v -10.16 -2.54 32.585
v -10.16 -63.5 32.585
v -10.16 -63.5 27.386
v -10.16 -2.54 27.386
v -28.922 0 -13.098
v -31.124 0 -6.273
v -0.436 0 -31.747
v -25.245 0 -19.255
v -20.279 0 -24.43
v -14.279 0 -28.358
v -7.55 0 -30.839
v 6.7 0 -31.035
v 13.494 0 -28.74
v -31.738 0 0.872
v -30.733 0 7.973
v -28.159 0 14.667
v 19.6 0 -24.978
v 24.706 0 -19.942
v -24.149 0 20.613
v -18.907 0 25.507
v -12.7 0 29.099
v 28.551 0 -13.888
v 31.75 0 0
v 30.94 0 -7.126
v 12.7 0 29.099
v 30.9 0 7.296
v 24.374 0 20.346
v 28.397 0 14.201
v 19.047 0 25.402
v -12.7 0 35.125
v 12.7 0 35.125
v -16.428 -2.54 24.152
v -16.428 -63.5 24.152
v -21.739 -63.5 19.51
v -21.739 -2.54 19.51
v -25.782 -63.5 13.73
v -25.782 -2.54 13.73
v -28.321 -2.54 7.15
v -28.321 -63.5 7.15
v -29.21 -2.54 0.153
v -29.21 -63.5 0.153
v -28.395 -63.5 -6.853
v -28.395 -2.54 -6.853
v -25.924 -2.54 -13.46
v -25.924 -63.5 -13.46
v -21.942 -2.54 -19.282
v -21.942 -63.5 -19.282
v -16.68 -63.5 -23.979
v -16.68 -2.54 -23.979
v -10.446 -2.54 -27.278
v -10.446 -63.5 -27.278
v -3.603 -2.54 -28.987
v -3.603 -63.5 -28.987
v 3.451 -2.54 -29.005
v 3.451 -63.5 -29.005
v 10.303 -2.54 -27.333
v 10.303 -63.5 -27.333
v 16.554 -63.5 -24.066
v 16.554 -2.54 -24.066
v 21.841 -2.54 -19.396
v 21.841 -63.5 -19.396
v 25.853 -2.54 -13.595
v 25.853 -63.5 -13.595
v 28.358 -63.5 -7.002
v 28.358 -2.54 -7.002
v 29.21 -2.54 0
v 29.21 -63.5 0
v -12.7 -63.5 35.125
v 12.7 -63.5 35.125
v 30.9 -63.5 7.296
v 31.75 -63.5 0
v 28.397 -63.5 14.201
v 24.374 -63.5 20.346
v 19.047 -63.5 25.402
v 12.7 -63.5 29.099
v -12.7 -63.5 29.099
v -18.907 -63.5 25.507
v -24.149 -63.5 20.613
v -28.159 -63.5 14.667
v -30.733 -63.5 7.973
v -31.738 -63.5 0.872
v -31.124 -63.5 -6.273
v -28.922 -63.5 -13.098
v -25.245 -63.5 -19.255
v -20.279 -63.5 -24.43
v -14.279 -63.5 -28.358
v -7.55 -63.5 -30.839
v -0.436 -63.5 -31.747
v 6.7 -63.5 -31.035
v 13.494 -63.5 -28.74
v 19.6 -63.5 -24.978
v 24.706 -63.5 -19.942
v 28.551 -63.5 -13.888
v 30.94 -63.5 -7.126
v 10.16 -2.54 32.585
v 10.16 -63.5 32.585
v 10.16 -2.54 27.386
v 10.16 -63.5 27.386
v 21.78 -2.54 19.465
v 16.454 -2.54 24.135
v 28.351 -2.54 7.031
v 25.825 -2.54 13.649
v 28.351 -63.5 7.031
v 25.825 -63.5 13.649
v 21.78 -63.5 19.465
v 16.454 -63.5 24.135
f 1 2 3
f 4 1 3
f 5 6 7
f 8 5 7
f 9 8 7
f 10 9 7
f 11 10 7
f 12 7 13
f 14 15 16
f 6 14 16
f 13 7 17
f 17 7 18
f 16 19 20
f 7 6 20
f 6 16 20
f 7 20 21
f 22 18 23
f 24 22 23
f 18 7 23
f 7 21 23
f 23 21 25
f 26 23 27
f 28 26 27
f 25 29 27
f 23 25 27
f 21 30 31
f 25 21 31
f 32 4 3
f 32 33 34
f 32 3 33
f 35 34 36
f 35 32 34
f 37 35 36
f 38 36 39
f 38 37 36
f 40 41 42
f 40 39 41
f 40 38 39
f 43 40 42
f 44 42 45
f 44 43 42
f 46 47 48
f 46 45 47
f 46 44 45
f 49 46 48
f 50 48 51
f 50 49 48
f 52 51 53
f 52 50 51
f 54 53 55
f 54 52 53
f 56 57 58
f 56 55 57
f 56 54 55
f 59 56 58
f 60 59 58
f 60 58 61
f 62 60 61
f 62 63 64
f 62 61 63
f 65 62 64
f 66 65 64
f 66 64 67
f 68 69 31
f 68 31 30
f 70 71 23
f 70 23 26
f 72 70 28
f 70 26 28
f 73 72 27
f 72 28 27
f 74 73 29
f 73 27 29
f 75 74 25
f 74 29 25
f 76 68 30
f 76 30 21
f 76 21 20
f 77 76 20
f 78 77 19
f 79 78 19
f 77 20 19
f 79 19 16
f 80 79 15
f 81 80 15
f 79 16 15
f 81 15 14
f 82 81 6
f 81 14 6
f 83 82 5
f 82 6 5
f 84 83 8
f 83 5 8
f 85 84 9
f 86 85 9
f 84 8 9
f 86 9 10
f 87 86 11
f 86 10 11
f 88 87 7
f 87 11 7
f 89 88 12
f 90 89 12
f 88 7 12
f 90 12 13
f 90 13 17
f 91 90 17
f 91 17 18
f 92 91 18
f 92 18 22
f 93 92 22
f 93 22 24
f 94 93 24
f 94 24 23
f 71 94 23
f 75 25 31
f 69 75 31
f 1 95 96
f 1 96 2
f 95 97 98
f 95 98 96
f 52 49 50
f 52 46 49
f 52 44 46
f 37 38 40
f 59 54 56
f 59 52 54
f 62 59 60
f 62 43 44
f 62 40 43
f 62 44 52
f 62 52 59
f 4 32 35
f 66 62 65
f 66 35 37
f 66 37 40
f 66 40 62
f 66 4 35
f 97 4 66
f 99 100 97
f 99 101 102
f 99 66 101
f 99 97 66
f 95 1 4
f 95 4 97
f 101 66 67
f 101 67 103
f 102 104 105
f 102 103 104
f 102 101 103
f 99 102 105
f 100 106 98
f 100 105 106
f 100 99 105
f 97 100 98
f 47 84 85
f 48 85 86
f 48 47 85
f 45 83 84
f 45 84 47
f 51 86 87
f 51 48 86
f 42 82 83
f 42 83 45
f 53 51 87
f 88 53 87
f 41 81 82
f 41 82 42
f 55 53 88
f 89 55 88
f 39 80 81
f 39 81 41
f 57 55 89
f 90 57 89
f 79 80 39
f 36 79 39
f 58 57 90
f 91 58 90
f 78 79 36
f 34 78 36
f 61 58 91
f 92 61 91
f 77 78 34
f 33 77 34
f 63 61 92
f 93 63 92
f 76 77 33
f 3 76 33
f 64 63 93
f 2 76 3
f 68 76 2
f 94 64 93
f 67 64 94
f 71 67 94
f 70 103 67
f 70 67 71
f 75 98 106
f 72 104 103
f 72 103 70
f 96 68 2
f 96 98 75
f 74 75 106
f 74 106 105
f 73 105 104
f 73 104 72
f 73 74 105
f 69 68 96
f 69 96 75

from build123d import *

# Parameters (mm, degrees)
F1_DEPTH = 63.5
F2_T     = -2.54


with BuildPart() as f1:
    # F0 (on Front) → F1 (new body)
    with BuildSketch(Plane.XZ):
        with BuildLine():
            ThreePointArc((-12.7, 29.099355663), (0, 31.75), (12.7, 29.099355663))
            Line((12.7, 29.099355663), (12.7, 35.1254418492))
            Line((12.7, 35.1254418492), (-12.7, 35.1254418492))
            Line((-12.7, 35.1254418492), (-12.7, 29.099355663))
        make_face()
        with BuildLine():
            ThreePointArc((-12.7, 29.099355663), (-17.3901912008, -26.5639558425), (31.75, 0))
            ThreePointArc((31.75, 0), (26.5639558425, 17.3901912008), (12.7, 29.099355663))
            Line((12.7, 29.099355663), (12.7, 28.3745581508))
            Line((12.7, 28.3745581508), (6.3699584668, 28.3745581508))
            ThreePointArc((6.3699584668, 28.3745581508), (22.7039126469, 18.1720739499), (29.0807826772, 0))
            ThreePointArc((29.0807826772, 0), (-18.1720739499, -22.7039126469), (-6.3699584668, 28.3745581508))
            Line((-6.3699584668, 28.3745581508), (-12.7, 28.3745581508))
            Line((-12.7, 28.3745581508), (-12.7, 29.099355663))
        make_face()
        with BuildLine():
            ThreePointArc((29.0807826772, 0), (22.7039126469, 18.1720739499), (6.3699584668, 28.3745581508))
            Line((6.3699584668, 28.3745581508), (-6.3699584668, 28.3745581508))
            ThreePointArc((-6.3699584668, 28.3745581508), (-18.1720739499, -22.7039126469), (29.0807826772, 0))
        make_face()
        with BuildLine():
            Line((-6.3699584668, 28.3745581508), (6.3699584668, 28.3745581508))
            ThreePointArc((6.3699584668, 28.3745581508), (0, 29.0807826772), (-6.3699584668, 28.3745581508))
        make_face()
        with BuildLine():
            Line((12.7, 28.3745581508), (12.7, 29.099355663))
            ThreePointArc((12.7, 29.099355663), (0, 31.75), (-12.7, 29.099355663))
            Line((-12.7, 29.099355663), (-12.7, 28.3745581508))
            Line((-12.7, 28.3745581508), (-6.3699584668, 28.3745581508))
            ThreePointArc((-6.3699584668, 28.3745581508), (0, 29.0807826772), (6.3699584668, 28.3745581508))
            Line((6.3699584668, 28.3745581508), (12.7, 28.3745581508))
        make_face()
    extrude(amount=F1_DEPTH)

    # F2
    f2_openings = [f1.faces().sort_by_distance(p)[0] for p in [
        (0, -63.5, 1.083948),
    ]]
    offset(amount=F2_T, openings=f2_openings, kind=Kind.INTERSECTION)


solid = f1.part
